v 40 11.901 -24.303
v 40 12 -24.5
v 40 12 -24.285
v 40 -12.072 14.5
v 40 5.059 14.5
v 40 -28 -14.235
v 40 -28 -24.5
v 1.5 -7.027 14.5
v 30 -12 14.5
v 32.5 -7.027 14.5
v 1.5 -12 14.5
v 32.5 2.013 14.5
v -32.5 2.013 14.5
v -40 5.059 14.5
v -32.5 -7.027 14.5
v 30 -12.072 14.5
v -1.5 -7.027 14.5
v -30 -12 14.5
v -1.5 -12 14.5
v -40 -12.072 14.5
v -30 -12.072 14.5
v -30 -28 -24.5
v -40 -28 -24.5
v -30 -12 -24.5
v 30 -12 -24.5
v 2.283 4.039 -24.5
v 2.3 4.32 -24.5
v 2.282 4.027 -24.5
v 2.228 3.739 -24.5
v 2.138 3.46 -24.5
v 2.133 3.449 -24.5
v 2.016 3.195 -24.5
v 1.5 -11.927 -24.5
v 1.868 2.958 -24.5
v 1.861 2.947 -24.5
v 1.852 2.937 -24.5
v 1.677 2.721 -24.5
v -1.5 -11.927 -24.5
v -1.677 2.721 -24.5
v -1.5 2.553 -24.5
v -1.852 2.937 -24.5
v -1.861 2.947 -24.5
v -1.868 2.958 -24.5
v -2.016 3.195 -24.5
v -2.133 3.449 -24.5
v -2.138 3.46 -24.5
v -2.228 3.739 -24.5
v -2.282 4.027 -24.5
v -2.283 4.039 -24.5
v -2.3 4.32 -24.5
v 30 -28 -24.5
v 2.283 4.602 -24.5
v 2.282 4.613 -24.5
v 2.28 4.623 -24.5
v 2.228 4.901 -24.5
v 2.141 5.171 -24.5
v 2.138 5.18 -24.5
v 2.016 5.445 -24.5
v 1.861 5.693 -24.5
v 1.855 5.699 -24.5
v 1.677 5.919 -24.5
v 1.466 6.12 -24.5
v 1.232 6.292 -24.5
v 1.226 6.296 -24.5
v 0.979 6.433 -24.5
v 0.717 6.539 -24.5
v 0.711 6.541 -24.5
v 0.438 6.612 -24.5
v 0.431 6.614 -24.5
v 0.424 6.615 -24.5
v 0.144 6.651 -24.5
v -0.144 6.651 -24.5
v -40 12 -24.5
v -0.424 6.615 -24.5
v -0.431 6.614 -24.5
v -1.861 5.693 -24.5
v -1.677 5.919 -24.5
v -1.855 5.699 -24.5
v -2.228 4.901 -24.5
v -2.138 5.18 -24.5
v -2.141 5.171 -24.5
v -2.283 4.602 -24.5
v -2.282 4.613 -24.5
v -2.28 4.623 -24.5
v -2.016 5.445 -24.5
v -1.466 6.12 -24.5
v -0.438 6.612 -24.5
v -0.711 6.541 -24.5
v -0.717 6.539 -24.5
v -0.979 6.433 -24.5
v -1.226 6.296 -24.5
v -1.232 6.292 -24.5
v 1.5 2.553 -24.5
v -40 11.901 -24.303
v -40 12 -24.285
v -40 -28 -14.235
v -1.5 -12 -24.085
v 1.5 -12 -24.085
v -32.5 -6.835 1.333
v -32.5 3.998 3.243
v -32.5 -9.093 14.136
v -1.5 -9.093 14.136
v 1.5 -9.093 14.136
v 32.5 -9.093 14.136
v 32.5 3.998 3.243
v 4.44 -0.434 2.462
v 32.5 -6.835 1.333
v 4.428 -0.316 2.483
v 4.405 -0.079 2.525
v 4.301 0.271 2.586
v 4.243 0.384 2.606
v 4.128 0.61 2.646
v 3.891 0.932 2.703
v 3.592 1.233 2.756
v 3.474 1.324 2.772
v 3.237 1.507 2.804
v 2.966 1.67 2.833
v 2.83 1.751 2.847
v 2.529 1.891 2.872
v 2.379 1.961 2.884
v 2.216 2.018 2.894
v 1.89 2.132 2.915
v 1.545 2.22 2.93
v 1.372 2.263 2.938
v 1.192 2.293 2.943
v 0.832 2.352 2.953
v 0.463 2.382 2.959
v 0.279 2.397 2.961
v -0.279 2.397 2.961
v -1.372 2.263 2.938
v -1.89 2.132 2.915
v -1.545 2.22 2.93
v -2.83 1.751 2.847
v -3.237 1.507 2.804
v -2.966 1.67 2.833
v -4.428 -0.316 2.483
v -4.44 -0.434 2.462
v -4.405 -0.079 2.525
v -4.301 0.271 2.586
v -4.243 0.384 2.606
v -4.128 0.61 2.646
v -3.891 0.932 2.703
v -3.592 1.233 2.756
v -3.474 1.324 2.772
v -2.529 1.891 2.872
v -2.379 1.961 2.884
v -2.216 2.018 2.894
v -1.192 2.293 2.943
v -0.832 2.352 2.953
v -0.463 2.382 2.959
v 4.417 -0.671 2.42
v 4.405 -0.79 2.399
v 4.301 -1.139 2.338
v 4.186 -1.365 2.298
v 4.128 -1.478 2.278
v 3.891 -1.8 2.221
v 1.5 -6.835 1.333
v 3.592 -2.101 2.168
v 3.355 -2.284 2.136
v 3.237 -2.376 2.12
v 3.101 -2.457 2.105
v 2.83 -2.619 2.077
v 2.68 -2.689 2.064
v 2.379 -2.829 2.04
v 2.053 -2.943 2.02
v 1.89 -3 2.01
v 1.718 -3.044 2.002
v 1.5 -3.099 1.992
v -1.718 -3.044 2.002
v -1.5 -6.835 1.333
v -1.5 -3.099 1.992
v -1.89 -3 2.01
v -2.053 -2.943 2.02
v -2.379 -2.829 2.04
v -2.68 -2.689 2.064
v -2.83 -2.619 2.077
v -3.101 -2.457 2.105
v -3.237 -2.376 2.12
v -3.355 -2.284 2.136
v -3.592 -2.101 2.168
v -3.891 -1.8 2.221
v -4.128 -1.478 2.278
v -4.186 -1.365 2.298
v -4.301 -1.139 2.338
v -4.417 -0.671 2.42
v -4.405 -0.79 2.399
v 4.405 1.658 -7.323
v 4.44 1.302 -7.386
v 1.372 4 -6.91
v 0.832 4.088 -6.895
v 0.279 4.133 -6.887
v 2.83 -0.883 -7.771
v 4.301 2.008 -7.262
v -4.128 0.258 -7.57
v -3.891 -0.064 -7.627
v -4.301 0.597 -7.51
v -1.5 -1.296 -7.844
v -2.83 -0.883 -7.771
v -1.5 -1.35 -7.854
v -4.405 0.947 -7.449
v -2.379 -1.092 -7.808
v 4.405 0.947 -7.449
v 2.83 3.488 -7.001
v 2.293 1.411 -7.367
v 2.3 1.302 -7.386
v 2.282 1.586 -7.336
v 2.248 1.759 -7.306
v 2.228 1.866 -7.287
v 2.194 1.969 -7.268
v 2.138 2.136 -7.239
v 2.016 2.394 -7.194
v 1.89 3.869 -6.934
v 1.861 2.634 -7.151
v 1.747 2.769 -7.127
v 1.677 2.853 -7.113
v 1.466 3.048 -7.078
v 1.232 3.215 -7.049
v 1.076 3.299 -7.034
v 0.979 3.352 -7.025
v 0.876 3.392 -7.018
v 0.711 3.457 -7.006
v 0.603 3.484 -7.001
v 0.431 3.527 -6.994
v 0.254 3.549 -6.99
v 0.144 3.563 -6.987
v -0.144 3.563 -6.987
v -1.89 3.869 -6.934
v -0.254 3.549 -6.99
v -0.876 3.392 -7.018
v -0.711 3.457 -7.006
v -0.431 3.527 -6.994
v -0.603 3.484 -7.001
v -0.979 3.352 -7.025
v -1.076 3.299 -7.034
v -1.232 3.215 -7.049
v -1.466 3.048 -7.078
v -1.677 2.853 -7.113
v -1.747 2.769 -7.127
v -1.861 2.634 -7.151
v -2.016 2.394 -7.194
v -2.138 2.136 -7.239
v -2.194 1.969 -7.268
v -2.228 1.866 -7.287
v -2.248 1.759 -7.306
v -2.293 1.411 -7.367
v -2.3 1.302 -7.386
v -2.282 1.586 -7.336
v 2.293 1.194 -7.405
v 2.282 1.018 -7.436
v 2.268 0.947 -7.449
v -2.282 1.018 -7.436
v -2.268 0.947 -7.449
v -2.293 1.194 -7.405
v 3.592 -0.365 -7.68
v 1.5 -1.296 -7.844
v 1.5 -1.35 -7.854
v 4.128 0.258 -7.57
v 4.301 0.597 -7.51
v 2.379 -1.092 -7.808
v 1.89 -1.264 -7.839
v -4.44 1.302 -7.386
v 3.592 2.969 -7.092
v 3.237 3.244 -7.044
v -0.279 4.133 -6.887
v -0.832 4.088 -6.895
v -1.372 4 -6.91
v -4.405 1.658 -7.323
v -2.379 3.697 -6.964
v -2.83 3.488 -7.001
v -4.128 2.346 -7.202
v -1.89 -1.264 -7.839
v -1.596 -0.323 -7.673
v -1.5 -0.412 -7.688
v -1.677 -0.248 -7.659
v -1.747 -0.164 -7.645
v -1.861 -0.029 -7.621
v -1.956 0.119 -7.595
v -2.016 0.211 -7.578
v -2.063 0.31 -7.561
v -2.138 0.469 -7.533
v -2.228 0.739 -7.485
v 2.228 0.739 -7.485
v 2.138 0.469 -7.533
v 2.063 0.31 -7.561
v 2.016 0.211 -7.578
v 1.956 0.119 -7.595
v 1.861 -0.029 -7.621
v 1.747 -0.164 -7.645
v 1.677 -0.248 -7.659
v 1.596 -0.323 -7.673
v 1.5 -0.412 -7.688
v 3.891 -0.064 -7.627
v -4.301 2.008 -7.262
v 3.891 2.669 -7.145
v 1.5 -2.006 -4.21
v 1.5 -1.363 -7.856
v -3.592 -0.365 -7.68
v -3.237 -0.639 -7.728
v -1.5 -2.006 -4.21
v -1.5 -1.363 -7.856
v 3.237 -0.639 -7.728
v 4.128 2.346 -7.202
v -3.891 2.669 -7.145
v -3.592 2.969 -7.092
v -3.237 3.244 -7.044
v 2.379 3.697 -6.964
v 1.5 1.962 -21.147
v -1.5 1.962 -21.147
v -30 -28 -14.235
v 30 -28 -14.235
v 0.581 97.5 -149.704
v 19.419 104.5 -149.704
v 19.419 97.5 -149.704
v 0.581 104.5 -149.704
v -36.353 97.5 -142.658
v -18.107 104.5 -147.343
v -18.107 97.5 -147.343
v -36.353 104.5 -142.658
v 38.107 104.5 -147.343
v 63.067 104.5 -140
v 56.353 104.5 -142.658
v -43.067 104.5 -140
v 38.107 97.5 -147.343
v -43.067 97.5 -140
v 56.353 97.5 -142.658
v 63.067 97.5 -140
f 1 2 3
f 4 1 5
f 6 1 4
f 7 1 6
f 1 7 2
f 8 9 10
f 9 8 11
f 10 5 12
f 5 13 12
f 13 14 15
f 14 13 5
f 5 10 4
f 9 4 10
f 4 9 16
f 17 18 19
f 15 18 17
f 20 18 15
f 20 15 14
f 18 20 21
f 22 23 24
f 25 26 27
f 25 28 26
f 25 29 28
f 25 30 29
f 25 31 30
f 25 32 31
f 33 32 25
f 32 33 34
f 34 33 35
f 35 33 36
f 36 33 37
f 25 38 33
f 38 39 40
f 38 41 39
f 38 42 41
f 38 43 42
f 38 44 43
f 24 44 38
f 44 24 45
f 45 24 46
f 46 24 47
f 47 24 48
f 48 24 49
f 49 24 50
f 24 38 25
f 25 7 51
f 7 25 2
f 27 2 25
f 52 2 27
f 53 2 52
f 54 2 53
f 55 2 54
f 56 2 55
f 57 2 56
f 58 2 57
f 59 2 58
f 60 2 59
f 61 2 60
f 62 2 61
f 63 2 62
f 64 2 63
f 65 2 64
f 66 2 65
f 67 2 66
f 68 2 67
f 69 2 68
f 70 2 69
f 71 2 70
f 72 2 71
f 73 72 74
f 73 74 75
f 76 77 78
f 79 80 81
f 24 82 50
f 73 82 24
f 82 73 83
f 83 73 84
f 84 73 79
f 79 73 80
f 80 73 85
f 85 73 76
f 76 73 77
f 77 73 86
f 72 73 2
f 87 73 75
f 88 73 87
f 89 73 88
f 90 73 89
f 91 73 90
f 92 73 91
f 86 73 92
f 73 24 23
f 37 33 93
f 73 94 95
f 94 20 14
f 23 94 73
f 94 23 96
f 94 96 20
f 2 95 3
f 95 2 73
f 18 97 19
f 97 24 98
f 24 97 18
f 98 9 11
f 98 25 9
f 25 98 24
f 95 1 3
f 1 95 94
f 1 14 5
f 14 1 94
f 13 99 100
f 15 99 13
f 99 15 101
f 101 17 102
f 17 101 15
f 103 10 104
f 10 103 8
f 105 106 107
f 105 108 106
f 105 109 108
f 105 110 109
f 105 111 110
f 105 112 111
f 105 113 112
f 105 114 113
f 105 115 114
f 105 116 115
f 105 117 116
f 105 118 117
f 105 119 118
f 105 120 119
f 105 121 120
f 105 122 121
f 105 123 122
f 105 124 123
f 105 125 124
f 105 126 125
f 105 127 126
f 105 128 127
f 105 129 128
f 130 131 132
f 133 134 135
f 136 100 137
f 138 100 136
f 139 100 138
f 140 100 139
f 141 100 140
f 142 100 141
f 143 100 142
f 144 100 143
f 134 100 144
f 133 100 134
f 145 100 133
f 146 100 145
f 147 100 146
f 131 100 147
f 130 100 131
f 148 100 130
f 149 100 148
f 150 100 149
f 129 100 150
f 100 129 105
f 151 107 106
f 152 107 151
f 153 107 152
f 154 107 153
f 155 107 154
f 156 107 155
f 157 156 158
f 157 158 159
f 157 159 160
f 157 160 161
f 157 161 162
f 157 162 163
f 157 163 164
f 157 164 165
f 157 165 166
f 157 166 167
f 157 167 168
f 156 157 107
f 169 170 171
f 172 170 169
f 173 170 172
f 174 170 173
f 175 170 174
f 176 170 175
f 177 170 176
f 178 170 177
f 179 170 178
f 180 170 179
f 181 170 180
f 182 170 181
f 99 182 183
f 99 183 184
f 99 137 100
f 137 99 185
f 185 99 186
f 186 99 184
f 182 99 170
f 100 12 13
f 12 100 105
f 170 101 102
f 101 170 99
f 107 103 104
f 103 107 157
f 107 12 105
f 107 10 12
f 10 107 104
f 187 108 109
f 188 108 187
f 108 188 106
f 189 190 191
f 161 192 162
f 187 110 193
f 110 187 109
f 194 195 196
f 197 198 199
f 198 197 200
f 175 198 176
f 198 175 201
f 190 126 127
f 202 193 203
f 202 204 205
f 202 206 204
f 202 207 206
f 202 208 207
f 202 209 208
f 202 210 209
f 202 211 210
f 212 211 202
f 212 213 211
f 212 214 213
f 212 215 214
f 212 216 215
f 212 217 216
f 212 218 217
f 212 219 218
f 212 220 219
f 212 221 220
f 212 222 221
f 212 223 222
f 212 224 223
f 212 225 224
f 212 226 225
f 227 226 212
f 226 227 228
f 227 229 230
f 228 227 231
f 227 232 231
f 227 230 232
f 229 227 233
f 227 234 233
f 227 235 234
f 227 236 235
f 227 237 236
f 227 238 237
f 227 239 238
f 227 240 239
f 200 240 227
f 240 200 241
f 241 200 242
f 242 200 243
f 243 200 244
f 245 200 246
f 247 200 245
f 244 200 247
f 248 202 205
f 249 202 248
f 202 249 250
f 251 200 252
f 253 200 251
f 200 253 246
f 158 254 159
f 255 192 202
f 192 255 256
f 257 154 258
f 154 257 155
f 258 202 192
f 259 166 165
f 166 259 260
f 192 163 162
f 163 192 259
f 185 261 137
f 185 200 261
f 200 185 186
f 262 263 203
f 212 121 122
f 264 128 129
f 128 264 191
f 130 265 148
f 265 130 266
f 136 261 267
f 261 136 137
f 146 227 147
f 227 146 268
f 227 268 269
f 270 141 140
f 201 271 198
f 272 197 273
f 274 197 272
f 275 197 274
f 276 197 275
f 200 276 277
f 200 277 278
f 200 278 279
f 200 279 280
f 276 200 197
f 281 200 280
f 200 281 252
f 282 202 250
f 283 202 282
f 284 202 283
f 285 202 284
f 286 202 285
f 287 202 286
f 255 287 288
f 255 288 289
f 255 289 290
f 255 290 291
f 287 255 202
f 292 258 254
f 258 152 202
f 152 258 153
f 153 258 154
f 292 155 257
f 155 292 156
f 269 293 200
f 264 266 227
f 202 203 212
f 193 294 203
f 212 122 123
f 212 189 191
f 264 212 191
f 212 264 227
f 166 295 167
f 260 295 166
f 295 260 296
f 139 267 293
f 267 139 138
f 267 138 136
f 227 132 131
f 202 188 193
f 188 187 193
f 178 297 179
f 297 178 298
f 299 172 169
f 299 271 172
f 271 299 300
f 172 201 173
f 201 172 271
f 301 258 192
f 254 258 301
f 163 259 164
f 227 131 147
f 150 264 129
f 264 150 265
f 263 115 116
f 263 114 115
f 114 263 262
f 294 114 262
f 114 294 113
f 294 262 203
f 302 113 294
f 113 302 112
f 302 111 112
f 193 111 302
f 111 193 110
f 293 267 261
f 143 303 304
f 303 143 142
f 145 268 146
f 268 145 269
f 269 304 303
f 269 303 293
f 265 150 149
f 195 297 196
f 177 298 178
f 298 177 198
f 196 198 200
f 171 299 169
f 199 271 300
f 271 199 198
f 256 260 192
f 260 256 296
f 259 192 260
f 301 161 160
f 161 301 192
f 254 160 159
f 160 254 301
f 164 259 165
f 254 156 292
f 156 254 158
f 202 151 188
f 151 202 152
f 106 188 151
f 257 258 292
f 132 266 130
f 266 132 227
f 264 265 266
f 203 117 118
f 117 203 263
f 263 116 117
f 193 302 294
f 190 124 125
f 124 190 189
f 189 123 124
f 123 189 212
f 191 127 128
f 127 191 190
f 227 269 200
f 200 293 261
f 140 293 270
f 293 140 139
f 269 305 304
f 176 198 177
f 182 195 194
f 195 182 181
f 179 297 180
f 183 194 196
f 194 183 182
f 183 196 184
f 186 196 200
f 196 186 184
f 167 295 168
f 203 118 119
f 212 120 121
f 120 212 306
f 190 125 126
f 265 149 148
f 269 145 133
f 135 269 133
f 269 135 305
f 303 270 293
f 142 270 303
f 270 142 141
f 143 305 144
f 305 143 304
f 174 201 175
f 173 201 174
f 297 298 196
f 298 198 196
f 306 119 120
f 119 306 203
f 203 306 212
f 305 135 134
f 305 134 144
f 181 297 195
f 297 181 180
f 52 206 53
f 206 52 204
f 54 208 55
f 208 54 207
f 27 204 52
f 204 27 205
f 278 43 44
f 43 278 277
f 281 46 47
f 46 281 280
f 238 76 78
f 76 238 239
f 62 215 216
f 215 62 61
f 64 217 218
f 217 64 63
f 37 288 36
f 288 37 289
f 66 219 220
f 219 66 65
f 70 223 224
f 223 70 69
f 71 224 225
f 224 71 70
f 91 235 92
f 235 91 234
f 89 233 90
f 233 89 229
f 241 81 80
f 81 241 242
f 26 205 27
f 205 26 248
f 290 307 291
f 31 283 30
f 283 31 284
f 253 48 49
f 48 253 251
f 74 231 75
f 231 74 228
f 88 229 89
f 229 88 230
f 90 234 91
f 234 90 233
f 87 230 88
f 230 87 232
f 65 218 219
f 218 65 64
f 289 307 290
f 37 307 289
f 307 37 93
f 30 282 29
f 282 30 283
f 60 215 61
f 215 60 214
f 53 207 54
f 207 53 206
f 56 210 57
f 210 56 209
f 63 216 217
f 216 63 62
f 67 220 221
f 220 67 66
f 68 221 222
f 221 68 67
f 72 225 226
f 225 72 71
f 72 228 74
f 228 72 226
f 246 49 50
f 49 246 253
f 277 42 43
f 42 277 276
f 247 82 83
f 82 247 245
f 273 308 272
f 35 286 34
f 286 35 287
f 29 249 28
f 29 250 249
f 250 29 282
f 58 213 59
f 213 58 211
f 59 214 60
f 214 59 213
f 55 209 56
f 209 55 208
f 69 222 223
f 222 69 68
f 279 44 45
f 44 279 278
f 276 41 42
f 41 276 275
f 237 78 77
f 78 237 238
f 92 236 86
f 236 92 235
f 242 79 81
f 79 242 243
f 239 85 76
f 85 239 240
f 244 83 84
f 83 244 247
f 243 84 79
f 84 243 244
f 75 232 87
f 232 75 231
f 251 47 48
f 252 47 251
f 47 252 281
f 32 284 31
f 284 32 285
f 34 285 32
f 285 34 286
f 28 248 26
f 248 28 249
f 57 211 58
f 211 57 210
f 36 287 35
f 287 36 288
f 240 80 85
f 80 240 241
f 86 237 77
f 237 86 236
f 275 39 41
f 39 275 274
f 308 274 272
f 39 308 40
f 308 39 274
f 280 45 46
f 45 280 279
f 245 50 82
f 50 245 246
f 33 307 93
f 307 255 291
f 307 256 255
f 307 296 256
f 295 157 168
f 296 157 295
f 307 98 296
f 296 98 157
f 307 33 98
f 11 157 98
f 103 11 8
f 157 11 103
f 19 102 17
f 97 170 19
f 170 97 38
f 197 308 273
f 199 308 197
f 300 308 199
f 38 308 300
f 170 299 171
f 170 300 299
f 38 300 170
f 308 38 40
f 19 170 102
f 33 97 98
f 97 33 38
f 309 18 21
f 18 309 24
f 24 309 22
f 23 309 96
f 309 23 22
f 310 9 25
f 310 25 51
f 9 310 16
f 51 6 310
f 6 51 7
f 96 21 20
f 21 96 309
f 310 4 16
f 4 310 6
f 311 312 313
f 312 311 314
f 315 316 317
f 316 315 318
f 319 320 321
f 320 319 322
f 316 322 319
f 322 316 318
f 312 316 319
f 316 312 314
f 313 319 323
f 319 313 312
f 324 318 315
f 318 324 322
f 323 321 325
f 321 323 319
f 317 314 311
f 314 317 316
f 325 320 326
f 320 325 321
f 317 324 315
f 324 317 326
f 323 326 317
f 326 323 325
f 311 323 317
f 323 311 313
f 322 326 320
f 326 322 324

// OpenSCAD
difference(){
	translate([0,0,-5]) cube(size = [80,24,39], center = true);
	rotate([10,0,0]) translate([0,11,-5]) color("blue") cube(size = [81,7,42], center = true);
	rotate([10,0,0]) translate([0,-1,9]) color("green") cube(size = [65,11,13], center = true);
	rotate([10,0,0]) scale([1.85,1.2,1])  cylinder(h = 15	, r=2.4,$fn=50, center=true);	
	rotate([10,0,0]) translate([0,0,-11]) cylinder(h = 30, r=2.3,$fn=50, center=true);	
	rotate([10,0,0]) translate([0,-7.5,-5]) color("red") cube(size = [3,17,45], center=true);

}

difference(){
	union(){
		translate([-35,-20,-5]) cube(size = [10,16,39], center = true);	
		translate([35,-20,-5]) cube(size = [10,16,39], center = true);
	}
	translate([0,-26,10]) rotate([61,0,0]) cube(size = [81,45,20], center = true);
}
module arc(x,y,z){
	difference(){
	rotate([90,0,0]) translate([10,0,-101]) cylinder(h = 7, r=150,$fn=50, center=true);
	rotate([90,0,0])translate([10,10,-101]) cube(size = [300,300,39], center = true);

	}
}
arc();
